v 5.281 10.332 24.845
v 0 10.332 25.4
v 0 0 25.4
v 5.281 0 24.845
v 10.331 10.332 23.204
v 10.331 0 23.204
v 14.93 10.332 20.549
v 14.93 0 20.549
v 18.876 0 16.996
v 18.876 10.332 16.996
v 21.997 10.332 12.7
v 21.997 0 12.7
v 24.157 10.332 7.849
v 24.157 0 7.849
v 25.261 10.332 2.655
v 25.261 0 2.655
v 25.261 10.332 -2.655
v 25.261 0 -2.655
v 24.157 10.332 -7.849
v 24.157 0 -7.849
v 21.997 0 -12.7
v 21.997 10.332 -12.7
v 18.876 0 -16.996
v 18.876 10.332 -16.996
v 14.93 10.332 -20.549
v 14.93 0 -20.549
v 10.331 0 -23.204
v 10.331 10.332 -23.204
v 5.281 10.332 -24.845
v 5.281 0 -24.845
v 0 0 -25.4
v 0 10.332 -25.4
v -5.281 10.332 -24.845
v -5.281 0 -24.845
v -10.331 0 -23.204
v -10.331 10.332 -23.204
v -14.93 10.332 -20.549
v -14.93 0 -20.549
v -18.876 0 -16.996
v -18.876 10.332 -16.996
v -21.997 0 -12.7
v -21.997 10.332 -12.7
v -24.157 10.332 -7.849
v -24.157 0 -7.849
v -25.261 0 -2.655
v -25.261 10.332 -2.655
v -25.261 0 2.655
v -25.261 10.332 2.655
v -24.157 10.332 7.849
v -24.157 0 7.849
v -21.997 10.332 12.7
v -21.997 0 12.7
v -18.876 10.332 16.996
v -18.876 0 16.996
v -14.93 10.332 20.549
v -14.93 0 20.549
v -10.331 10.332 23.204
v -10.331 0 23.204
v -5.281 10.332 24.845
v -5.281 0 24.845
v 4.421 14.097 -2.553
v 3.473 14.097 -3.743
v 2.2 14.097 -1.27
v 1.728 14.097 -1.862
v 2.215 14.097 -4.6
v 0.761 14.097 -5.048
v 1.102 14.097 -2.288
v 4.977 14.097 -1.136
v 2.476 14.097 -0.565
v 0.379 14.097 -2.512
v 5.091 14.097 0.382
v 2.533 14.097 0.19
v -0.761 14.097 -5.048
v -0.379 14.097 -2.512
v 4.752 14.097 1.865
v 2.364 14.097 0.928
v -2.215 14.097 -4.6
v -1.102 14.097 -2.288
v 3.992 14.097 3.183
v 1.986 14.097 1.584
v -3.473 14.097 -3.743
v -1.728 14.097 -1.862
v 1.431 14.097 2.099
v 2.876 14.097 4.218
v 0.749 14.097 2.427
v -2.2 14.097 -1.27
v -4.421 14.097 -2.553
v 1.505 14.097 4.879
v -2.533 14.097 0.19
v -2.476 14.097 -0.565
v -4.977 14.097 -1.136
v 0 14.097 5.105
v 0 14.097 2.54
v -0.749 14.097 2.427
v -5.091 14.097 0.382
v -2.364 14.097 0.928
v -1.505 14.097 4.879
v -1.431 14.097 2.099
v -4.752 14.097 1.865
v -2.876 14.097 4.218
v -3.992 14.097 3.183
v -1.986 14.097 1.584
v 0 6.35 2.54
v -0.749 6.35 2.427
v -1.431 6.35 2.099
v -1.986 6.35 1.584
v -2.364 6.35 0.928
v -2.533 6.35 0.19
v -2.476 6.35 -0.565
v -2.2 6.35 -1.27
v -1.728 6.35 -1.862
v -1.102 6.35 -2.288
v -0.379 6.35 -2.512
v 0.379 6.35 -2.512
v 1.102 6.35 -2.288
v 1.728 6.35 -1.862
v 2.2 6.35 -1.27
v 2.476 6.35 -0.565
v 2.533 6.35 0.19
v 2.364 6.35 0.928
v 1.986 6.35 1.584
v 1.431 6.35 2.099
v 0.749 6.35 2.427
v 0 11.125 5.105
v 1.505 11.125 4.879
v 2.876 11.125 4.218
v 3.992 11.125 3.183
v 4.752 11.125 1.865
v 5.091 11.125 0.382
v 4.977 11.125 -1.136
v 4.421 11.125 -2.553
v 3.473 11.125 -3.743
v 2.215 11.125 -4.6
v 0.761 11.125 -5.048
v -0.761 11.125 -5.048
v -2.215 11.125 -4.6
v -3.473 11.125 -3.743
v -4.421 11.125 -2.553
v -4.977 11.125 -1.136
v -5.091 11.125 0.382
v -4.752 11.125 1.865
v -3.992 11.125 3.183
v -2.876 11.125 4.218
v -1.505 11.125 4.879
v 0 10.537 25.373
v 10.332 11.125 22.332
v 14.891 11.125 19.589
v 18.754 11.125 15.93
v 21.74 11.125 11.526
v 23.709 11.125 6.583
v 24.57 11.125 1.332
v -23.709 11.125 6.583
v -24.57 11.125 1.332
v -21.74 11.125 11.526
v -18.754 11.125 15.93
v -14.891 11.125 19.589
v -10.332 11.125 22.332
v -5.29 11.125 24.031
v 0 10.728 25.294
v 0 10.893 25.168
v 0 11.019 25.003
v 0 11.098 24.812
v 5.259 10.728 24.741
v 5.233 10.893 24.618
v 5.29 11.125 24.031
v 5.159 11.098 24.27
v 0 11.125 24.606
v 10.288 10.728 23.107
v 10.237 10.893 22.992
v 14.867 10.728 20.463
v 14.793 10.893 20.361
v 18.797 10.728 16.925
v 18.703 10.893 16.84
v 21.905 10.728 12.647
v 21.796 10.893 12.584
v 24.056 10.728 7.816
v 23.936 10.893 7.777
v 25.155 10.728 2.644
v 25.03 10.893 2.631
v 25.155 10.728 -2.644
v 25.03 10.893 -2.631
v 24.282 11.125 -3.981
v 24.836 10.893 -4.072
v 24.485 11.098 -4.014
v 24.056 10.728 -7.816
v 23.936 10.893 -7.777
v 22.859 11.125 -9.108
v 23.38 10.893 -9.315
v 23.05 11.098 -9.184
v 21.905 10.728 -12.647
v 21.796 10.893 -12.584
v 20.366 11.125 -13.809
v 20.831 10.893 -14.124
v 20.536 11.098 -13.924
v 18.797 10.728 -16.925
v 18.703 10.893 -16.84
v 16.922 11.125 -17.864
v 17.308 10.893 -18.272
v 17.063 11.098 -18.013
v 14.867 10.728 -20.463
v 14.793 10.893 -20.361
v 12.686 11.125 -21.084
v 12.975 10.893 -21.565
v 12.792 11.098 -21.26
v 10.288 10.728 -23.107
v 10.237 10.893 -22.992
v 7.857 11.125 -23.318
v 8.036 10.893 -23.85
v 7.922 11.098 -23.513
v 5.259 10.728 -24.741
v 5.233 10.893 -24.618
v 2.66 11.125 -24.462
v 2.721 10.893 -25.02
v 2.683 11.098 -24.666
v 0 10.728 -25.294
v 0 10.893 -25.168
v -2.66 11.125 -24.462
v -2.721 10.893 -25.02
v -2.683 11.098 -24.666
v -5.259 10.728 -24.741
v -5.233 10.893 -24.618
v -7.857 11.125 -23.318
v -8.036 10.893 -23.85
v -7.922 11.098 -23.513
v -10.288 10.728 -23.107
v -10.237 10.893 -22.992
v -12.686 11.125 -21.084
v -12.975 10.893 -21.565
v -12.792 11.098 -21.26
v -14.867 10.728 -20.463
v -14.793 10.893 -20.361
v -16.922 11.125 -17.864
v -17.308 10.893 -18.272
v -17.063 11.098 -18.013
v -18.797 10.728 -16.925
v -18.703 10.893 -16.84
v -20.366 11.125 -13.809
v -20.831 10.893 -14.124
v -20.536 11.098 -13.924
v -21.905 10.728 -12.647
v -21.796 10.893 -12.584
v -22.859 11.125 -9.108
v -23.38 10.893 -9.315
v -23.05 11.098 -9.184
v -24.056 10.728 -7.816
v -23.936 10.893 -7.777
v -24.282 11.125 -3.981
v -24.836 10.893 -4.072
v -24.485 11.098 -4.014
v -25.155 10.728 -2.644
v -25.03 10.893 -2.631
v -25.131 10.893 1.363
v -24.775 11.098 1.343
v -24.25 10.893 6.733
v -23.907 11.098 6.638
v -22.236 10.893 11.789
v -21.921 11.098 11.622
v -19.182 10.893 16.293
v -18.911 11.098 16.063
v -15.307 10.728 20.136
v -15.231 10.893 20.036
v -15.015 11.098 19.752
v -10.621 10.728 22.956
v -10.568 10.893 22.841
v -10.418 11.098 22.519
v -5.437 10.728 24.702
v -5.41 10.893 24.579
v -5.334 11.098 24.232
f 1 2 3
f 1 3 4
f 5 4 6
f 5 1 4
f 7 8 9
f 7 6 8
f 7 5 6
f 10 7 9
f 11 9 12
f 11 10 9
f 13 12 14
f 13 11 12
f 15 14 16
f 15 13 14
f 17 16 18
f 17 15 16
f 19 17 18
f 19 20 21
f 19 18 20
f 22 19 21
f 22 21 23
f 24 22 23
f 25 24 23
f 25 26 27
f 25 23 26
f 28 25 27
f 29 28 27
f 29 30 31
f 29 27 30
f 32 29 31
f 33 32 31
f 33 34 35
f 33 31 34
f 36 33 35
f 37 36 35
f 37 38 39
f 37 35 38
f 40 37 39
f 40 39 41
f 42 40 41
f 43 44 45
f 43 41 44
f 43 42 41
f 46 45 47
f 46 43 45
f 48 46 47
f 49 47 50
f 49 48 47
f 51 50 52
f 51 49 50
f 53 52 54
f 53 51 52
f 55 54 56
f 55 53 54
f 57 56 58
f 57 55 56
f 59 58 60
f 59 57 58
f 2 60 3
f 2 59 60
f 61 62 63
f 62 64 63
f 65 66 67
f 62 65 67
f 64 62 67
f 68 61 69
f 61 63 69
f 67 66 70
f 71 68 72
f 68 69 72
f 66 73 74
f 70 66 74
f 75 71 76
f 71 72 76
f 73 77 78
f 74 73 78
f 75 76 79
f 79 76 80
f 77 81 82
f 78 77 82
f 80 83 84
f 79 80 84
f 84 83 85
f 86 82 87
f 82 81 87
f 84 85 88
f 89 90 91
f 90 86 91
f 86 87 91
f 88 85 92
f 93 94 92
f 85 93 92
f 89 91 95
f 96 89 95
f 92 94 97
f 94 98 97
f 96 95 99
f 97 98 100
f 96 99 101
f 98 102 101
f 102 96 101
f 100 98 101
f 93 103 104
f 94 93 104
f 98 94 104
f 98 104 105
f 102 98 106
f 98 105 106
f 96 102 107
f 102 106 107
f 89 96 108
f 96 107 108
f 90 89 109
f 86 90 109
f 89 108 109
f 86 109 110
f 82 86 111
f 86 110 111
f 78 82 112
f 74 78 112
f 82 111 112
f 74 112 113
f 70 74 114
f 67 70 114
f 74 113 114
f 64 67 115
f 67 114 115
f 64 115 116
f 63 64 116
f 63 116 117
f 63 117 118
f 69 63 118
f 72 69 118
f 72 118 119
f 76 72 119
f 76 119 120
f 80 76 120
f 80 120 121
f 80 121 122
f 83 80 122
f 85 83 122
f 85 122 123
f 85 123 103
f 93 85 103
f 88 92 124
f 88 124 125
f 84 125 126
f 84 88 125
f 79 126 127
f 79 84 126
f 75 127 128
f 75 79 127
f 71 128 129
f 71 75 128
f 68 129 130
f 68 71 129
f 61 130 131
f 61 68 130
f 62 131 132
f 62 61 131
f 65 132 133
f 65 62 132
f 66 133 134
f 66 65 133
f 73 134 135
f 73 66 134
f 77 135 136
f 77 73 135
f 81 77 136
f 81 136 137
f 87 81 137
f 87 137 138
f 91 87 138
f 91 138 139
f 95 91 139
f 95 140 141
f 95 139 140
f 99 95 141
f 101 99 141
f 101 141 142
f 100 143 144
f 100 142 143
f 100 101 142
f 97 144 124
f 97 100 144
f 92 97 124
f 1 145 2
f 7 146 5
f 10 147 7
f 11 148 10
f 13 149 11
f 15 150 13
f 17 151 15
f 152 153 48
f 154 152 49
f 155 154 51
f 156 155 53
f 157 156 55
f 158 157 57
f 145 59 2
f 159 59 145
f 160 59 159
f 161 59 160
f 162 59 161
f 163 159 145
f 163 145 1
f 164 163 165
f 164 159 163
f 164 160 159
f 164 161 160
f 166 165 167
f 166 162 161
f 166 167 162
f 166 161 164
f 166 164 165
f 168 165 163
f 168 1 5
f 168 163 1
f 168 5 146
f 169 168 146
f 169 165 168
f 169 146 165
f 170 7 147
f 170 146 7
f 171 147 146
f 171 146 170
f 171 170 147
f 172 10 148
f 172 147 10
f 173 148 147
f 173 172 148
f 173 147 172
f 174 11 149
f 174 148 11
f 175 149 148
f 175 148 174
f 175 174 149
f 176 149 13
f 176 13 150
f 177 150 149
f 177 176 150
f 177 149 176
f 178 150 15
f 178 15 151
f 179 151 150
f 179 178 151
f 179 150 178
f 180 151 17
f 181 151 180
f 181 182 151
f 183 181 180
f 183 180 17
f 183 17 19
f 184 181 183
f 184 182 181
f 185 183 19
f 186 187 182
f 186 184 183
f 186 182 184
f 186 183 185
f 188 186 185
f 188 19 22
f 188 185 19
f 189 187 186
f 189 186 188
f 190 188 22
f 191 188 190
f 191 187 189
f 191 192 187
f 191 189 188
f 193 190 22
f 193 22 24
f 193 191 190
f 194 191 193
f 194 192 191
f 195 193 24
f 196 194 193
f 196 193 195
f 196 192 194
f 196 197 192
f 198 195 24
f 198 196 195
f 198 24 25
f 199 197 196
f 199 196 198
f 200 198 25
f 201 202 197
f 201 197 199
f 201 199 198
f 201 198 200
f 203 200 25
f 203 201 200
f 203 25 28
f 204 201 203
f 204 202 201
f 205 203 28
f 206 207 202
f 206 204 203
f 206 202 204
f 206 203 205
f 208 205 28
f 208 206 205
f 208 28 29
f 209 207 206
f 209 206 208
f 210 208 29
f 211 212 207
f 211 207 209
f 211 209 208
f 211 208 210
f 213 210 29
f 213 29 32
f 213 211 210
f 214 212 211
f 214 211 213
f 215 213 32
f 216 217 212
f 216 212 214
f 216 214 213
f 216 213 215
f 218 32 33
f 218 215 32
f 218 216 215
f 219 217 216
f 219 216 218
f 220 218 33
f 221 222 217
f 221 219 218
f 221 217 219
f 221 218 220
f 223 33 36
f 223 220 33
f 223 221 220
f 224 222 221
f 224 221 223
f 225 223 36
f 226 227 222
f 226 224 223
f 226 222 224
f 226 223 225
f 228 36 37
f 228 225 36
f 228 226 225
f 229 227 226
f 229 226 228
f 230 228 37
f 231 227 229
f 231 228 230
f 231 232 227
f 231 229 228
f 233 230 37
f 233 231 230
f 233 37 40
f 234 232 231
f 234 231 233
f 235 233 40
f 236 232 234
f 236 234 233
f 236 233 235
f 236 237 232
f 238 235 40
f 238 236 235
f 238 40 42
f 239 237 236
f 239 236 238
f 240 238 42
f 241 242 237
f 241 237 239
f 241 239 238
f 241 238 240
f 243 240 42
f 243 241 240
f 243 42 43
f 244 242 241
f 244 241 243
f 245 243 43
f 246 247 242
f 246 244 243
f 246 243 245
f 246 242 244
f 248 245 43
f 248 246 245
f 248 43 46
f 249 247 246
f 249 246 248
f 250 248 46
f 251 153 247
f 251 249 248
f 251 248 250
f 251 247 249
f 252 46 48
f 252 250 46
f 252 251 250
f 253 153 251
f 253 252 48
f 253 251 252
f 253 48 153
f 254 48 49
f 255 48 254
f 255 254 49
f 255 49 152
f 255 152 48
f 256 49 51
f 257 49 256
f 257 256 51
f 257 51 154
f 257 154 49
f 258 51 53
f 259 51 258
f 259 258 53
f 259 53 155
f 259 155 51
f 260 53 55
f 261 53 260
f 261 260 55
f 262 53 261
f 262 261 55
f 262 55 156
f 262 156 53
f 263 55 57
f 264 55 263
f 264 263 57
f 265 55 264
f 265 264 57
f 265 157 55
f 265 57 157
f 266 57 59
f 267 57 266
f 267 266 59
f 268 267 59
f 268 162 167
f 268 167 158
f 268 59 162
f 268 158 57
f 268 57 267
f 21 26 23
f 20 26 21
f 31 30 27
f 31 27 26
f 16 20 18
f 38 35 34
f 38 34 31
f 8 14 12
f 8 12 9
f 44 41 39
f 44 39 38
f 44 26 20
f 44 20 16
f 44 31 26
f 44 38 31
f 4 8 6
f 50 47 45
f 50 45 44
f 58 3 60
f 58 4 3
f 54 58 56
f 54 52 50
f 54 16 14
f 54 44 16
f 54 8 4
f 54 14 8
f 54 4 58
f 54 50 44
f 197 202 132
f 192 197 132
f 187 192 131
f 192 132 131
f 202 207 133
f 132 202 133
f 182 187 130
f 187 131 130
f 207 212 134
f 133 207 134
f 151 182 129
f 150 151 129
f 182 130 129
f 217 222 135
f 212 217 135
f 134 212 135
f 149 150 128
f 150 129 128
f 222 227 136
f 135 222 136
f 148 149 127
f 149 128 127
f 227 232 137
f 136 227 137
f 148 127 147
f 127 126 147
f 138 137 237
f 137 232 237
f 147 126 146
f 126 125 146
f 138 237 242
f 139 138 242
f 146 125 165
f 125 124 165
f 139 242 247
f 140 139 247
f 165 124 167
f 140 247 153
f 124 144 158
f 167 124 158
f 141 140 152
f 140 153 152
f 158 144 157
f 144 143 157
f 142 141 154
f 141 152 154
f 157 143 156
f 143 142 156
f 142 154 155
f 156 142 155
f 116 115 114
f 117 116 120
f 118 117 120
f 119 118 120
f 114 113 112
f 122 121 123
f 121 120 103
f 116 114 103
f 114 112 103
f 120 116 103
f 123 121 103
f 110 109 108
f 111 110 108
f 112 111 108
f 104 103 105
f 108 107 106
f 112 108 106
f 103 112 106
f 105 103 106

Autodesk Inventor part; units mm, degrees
ref_plane "YZ Plane" through (0, 0, 0) normal (1, 0, 0) x (0, 1, 0)
ref_plane "XZ Plane" through (0, 0, 0) normal (0, 1, 0) x (-1, 0, 0)
ref_plane "XY Plane" through (0, 0, 0) normal (0, 0, 1) x (1, 0, 0)
sketch "Sketch1" plane through (0, 0, 0) normal (1, 0, 0) x (0, 1, 0)
  line L0 (0, 0) -> (0, 25.4)
  line L1 (0, 25.4) -> (11.1252, 25.4)
  line L2 (11.1252, 25.4) -> (11.1252, 5.1054)
  line L3 (11.1252, 5.1054) -> (14.097, 5.1054)
  line L4 (14.097, 5.1054) -> (14.097, 2.54)
  line L5 (14.097, 2.54) -> (6.35, 2.54)
  line L6 (6.35, 2.54) -> (6.35, 0)
  line L7 (6.35, 0) -> (0, 0)
  dimension "d1" = 11.1252
  dimension "d2" = 50.8
  dimension "d3" = 14.097
  dimension "d4" = 5.08
  dimension "d5" = 10.2108
  dimension "d6" = 6.35
revolve "Revolution1" add sketch "Sketch1" angle 360 about axis through (0, 6.35, 0) along (0, -1, 0)
fillet "Fillet1" radius 0.7937 1 edges at (0, 11.1252, -25.4)
properties part number "BIG-MAGNET" material "Steel, Alloy"
